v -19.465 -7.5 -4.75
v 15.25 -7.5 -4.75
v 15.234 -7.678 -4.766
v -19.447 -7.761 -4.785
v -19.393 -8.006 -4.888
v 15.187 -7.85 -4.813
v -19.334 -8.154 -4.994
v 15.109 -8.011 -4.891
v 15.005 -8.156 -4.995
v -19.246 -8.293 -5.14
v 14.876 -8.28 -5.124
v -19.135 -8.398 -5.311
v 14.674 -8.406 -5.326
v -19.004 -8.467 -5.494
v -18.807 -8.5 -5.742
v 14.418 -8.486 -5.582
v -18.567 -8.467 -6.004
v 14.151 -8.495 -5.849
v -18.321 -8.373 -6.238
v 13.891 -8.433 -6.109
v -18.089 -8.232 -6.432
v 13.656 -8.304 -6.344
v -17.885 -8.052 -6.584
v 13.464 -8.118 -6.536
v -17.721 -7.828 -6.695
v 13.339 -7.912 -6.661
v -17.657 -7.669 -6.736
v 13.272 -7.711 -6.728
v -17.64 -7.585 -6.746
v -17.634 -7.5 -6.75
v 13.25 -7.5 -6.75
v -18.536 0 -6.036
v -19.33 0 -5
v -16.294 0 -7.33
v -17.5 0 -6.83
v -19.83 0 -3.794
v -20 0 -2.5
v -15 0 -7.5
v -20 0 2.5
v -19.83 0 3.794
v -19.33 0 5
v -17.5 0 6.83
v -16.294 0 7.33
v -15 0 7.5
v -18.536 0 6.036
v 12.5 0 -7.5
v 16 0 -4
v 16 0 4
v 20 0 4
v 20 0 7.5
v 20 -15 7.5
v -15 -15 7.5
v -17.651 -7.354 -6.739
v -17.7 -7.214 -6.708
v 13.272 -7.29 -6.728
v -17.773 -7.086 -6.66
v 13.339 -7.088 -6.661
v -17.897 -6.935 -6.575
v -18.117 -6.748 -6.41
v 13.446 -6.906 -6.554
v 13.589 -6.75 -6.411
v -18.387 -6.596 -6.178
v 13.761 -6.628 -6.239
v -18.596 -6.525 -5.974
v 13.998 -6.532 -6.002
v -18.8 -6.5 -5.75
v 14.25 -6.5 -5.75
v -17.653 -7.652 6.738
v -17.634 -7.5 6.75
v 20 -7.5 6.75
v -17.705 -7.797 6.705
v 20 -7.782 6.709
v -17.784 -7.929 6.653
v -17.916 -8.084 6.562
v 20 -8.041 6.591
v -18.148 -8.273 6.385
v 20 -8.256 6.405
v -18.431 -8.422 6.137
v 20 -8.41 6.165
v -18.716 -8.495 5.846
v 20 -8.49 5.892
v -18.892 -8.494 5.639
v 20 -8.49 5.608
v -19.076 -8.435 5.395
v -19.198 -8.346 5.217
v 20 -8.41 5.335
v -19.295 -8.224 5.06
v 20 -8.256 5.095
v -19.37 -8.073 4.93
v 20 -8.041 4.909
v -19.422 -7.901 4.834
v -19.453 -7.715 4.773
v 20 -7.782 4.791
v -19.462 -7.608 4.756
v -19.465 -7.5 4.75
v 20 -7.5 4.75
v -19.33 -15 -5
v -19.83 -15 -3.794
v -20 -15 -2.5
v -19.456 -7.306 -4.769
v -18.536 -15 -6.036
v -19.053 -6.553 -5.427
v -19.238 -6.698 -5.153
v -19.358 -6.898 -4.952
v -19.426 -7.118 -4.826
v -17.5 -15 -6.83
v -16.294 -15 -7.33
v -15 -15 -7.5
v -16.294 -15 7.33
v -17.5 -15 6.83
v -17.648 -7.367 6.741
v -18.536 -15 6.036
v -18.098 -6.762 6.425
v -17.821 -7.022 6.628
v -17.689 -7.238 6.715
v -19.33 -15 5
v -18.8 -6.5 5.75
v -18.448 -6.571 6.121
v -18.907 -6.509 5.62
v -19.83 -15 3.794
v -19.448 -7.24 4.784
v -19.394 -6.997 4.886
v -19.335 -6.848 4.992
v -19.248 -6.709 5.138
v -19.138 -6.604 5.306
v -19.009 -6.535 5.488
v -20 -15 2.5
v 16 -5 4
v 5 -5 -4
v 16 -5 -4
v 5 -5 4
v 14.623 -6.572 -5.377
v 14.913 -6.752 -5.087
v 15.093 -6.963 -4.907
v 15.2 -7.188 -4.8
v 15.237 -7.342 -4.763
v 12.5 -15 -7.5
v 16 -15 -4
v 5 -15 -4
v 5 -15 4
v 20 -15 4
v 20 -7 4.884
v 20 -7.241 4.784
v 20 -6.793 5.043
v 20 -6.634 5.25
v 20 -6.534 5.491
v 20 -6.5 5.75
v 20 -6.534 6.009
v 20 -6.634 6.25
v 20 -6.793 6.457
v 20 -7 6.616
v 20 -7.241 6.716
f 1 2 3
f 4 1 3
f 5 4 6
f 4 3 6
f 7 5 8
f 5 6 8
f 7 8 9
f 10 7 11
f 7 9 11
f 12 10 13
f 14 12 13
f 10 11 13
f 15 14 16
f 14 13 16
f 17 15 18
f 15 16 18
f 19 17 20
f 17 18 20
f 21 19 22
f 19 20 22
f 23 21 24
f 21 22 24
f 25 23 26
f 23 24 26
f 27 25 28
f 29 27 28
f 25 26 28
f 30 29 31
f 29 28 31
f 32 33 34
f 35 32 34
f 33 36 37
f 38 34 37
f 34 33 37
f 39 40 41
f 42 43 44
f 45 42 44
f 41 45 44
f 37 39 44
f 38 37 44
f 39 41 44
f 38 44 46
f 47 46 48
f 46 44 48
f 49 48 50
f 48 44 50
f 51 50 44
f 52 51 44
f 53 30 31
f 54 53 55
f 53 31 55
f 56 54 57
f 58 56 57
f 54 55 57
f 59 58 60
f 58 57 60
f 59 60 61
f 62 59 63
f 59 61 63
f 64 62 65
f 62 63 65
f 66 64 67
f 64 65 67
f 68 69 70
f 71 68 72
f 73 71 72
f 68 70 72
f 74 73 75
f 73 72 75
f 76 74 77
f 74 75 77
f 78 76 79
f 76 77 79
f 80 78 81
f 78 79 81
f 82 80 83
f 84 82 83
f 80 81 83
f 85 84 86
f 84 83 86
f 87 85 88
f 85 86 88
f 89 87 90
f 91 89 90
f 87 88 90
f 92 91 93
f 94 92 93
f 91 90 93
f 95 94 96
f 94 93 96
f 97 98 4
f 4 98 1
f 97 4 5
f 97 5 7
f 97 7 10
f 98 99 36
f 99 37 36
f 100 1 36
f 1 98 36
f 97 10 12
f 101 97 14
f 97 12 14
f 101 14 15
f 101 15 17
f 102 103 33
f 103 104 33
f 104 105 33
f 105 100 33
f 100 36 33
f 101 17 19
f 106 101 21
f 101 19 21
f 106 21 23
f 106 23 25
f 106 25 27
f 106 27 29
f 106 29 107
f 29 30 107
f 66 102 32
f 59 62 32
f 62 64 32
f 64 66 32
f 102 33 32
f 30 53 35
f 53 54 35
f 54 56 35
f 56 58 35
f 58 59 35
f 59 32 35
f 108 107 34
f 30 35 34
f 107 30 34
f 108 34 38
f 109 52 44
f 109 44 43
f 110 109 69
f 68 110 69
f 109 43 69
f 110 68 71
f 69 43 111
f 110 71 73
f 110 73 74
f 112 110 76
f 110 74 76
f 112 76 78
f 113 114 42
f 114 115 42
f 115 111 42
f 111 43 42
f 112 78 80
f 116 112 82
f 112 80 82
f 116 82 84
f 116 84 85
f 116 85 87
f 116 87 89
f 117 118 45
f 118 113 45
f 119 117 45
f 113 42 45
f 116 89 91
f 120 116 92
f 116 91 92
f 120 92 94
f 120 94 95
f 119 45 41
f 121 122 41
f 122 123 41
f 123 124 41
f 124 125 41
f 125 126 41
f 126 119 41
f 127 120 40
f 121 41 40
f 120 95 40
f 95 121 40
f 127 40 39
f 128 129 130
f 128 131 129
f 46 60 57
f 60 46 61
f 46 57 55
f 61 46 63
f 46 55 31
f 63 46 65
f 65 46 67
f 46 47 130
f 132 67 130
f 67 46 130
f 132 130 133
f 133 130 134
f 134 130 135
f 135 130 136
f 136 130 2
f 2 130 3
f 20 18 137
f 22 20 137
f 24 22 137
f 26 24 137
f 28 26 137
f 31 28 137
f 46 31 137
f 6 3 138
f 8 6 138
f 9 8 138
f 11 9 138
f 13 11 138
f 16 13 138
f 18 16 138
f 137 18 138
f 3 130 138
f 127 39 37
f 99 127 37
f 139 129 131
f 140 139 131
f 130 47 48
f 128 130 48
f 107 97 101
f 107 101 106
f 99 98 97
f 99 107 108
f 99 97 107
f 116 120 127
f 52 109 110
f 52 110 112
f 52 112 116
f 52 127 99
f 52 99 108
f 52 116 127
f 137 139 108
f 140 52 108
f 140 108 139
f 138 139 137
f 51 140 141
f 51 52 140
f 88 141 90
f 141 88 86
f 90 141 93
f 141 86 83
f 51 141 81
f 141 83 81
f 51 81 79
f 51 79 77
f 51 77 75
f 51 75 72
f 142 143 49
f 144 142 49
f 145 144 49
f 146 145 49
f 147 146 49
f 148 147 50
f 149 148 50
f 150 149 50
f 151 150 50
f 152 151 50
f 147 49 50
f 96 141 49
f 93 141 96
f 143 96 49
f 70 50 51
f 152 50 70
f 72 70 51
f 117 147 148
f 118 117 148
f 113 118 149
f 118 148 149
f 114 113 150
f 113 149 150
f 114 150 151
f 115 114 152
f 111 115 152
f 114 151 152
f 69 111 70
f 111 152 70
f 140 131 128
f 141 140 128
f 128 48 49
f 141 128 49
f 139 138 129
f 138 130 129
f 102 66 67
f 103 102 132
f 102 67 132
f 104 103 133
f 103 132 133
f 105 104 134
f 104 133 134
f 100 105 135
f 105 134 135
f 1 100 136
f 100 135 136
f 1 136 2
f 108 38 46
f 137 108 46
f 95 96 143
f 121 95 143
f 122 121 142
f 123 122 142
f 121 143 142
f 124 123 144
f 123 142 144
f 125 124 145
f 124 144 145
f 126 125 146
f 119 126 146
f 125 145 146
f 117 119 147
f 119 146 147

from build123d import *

# Parameters (mm, degrees)
F0_W     = 4
F0_H     = 3.5
F0_W_2   = 11
F0_H_2   = 4
F0_W_3   = 10
F1_DEPTH = 15
F2_DEPTH = 5
F3_R     = 5
F4_R     = 5
F5_SIZE  = 3.5
F7_DEPTH = 40


with BuildPart() as f1:
    # F0 (on Front) → F1 (new body)
    with BuildSketch(Plane.XZ):
        with Locations((-18, -5.75)):
            Rectangle(F0_W, F0_H)
        Polygon((16, -4), (5, -4), (-5, -4), (-5, -7.5), (16, -7.5), align=None)
        Polygon((-16, 4), (-5, 4), (-5, 7.5), (-20, 7.5), (-20, 4), align=None)
        with Locations((-10.5, -5.75)):
            Rectangle(F0_W_2, F0_H)
        Polygon((-16, 0), (-16, 4), (-20, 4), (-20, -4), (-16, -4), align=None)
        Polygon((-5, 4), (5, 4), (16, 4), (20, 4), (20, 7.5), (-5, 7.5), align=None)
        with Locations((-10.5, 2)):
            Rectangle(F0_W_2, F0_H_2)
        with Locations((0, 2)):
            Rectangle(F0_W_3, F0_H_2)
        with Locations((-10.5, -2)):
            Rectangle(F0_W_2, F0_H_2)
        with Locations((0, -2)):
            Rectangle(F0_W_3, F0_H_2)
    extrude(amount=F1_DEPTH)

    # F0 (on Front) → F2 (join)
    with BuildSketch(Plane.XZ):
        with Locations((-10.5, 2)):
            Rectangle(F0_W_2, F0_H_2)
        with Locations((0, 2)):
            Rectangle(F0_W_3, F0_H_2)
        with Locations((0, -2)):
            Rectangle(F0_W_3, F0_H_2)
        with Locations((10.5, 2)):
            Rectangle(F0_W_2, F0_H_2)
        with Locations((-10.5, -2)):
            Rectangle(F0_W_2, F0_H_2)
        with Locations((10.5, -2)):
            Rectangle(F0_W_2, F0_H_2)
        Polygon((-5, 4), (5, 4), (16, 4), (20, 4), (20, 7.5), (-5, 7.5), align=None)
        Polygon((16, -4), (5, -4), (-5, -4), (-5, -7.5), (16, -7.5), align=None)
        with Locations((-10.5, -5.75)):
            Rectangle(F0_W_2, F0_H)
        with Locations((-18, -5.75)):
            Rectangle(F0_W, F0_H)
        Polygon((-16, 0), (-16, 4), (-20, 4), (-20, -4), (-16, -4), align=None)
        Polygon((-16, 4), (-5, 4), (-5, 7.5), (-20, 7.5), (-20, 4), align=None)
    extrude(amount=F2_DEPTH)

    # F3
    f3_edges = [f1.edges().sort_by_distance(p)[0] for p in [
        (-20, -7.5, 7.5),
    ]]
    fillet(f3_edges, radius=F3_R)

    # F4
    f4_edges = [f1.edges().sort_by_distance(p)[0] for p in [
        (-20, -7.5, -7.5),
    ]]
    fillet(f4_edges, radius=F4_R)

    # F5
    f5_edges = [f1.edges().sort_by_distance(p)[0] for p in [
        (16, -7.5, -7.5),
    ]]
    chamfer(f5_edges, length=F5_SIZE)

    # F6 (on face) → F7 (cut)
    with BuildSketch(Plane.YZ.offset(20)):
        with BuildLine():
            ThreePointArc((-6.5, -5.75), (-6.7928932188, -5.0428932188), (-7.5, -4.75))
            Line((-7.5, -4.75), (-7.5, -6.75))
            ThreePointArc((-7.5, -6.75), (-6.7928932188, -6.4571067812), (-6.5, -5.75))
        make_face()
        with BuildLine():
            Line((-7.5, -6.75), (-7.5, -4.75))
            ThreePointArc((-7.5, -4.75), (-8.5, -5.75), (-7.5, -6.75))
        make_face()
        with BuildLine():
            ThreePointArc((-7.5, 6.75), (-8.5, 5.75), (-7.5, 4.75))
            Line((-7.5, 4.75), (-7.5, 6.75))
        make_face()
        with BuildLine():
            Line((-7.5, 6.75), (-7.5, 4.75))
            ThreePointArc((-7.5, 4.75), (-6.7928932188, 5.0428932188), (-6.5, 5.75))
            ThreePointArc((-6.5, 5.75), (-6.7928932188, 6.4571067812), (-7.5, 6.75))
        make_face()
    extrude(amount=-F7_DEPTH, mode=Mode.SUBTRACT)


solid = f1.part
